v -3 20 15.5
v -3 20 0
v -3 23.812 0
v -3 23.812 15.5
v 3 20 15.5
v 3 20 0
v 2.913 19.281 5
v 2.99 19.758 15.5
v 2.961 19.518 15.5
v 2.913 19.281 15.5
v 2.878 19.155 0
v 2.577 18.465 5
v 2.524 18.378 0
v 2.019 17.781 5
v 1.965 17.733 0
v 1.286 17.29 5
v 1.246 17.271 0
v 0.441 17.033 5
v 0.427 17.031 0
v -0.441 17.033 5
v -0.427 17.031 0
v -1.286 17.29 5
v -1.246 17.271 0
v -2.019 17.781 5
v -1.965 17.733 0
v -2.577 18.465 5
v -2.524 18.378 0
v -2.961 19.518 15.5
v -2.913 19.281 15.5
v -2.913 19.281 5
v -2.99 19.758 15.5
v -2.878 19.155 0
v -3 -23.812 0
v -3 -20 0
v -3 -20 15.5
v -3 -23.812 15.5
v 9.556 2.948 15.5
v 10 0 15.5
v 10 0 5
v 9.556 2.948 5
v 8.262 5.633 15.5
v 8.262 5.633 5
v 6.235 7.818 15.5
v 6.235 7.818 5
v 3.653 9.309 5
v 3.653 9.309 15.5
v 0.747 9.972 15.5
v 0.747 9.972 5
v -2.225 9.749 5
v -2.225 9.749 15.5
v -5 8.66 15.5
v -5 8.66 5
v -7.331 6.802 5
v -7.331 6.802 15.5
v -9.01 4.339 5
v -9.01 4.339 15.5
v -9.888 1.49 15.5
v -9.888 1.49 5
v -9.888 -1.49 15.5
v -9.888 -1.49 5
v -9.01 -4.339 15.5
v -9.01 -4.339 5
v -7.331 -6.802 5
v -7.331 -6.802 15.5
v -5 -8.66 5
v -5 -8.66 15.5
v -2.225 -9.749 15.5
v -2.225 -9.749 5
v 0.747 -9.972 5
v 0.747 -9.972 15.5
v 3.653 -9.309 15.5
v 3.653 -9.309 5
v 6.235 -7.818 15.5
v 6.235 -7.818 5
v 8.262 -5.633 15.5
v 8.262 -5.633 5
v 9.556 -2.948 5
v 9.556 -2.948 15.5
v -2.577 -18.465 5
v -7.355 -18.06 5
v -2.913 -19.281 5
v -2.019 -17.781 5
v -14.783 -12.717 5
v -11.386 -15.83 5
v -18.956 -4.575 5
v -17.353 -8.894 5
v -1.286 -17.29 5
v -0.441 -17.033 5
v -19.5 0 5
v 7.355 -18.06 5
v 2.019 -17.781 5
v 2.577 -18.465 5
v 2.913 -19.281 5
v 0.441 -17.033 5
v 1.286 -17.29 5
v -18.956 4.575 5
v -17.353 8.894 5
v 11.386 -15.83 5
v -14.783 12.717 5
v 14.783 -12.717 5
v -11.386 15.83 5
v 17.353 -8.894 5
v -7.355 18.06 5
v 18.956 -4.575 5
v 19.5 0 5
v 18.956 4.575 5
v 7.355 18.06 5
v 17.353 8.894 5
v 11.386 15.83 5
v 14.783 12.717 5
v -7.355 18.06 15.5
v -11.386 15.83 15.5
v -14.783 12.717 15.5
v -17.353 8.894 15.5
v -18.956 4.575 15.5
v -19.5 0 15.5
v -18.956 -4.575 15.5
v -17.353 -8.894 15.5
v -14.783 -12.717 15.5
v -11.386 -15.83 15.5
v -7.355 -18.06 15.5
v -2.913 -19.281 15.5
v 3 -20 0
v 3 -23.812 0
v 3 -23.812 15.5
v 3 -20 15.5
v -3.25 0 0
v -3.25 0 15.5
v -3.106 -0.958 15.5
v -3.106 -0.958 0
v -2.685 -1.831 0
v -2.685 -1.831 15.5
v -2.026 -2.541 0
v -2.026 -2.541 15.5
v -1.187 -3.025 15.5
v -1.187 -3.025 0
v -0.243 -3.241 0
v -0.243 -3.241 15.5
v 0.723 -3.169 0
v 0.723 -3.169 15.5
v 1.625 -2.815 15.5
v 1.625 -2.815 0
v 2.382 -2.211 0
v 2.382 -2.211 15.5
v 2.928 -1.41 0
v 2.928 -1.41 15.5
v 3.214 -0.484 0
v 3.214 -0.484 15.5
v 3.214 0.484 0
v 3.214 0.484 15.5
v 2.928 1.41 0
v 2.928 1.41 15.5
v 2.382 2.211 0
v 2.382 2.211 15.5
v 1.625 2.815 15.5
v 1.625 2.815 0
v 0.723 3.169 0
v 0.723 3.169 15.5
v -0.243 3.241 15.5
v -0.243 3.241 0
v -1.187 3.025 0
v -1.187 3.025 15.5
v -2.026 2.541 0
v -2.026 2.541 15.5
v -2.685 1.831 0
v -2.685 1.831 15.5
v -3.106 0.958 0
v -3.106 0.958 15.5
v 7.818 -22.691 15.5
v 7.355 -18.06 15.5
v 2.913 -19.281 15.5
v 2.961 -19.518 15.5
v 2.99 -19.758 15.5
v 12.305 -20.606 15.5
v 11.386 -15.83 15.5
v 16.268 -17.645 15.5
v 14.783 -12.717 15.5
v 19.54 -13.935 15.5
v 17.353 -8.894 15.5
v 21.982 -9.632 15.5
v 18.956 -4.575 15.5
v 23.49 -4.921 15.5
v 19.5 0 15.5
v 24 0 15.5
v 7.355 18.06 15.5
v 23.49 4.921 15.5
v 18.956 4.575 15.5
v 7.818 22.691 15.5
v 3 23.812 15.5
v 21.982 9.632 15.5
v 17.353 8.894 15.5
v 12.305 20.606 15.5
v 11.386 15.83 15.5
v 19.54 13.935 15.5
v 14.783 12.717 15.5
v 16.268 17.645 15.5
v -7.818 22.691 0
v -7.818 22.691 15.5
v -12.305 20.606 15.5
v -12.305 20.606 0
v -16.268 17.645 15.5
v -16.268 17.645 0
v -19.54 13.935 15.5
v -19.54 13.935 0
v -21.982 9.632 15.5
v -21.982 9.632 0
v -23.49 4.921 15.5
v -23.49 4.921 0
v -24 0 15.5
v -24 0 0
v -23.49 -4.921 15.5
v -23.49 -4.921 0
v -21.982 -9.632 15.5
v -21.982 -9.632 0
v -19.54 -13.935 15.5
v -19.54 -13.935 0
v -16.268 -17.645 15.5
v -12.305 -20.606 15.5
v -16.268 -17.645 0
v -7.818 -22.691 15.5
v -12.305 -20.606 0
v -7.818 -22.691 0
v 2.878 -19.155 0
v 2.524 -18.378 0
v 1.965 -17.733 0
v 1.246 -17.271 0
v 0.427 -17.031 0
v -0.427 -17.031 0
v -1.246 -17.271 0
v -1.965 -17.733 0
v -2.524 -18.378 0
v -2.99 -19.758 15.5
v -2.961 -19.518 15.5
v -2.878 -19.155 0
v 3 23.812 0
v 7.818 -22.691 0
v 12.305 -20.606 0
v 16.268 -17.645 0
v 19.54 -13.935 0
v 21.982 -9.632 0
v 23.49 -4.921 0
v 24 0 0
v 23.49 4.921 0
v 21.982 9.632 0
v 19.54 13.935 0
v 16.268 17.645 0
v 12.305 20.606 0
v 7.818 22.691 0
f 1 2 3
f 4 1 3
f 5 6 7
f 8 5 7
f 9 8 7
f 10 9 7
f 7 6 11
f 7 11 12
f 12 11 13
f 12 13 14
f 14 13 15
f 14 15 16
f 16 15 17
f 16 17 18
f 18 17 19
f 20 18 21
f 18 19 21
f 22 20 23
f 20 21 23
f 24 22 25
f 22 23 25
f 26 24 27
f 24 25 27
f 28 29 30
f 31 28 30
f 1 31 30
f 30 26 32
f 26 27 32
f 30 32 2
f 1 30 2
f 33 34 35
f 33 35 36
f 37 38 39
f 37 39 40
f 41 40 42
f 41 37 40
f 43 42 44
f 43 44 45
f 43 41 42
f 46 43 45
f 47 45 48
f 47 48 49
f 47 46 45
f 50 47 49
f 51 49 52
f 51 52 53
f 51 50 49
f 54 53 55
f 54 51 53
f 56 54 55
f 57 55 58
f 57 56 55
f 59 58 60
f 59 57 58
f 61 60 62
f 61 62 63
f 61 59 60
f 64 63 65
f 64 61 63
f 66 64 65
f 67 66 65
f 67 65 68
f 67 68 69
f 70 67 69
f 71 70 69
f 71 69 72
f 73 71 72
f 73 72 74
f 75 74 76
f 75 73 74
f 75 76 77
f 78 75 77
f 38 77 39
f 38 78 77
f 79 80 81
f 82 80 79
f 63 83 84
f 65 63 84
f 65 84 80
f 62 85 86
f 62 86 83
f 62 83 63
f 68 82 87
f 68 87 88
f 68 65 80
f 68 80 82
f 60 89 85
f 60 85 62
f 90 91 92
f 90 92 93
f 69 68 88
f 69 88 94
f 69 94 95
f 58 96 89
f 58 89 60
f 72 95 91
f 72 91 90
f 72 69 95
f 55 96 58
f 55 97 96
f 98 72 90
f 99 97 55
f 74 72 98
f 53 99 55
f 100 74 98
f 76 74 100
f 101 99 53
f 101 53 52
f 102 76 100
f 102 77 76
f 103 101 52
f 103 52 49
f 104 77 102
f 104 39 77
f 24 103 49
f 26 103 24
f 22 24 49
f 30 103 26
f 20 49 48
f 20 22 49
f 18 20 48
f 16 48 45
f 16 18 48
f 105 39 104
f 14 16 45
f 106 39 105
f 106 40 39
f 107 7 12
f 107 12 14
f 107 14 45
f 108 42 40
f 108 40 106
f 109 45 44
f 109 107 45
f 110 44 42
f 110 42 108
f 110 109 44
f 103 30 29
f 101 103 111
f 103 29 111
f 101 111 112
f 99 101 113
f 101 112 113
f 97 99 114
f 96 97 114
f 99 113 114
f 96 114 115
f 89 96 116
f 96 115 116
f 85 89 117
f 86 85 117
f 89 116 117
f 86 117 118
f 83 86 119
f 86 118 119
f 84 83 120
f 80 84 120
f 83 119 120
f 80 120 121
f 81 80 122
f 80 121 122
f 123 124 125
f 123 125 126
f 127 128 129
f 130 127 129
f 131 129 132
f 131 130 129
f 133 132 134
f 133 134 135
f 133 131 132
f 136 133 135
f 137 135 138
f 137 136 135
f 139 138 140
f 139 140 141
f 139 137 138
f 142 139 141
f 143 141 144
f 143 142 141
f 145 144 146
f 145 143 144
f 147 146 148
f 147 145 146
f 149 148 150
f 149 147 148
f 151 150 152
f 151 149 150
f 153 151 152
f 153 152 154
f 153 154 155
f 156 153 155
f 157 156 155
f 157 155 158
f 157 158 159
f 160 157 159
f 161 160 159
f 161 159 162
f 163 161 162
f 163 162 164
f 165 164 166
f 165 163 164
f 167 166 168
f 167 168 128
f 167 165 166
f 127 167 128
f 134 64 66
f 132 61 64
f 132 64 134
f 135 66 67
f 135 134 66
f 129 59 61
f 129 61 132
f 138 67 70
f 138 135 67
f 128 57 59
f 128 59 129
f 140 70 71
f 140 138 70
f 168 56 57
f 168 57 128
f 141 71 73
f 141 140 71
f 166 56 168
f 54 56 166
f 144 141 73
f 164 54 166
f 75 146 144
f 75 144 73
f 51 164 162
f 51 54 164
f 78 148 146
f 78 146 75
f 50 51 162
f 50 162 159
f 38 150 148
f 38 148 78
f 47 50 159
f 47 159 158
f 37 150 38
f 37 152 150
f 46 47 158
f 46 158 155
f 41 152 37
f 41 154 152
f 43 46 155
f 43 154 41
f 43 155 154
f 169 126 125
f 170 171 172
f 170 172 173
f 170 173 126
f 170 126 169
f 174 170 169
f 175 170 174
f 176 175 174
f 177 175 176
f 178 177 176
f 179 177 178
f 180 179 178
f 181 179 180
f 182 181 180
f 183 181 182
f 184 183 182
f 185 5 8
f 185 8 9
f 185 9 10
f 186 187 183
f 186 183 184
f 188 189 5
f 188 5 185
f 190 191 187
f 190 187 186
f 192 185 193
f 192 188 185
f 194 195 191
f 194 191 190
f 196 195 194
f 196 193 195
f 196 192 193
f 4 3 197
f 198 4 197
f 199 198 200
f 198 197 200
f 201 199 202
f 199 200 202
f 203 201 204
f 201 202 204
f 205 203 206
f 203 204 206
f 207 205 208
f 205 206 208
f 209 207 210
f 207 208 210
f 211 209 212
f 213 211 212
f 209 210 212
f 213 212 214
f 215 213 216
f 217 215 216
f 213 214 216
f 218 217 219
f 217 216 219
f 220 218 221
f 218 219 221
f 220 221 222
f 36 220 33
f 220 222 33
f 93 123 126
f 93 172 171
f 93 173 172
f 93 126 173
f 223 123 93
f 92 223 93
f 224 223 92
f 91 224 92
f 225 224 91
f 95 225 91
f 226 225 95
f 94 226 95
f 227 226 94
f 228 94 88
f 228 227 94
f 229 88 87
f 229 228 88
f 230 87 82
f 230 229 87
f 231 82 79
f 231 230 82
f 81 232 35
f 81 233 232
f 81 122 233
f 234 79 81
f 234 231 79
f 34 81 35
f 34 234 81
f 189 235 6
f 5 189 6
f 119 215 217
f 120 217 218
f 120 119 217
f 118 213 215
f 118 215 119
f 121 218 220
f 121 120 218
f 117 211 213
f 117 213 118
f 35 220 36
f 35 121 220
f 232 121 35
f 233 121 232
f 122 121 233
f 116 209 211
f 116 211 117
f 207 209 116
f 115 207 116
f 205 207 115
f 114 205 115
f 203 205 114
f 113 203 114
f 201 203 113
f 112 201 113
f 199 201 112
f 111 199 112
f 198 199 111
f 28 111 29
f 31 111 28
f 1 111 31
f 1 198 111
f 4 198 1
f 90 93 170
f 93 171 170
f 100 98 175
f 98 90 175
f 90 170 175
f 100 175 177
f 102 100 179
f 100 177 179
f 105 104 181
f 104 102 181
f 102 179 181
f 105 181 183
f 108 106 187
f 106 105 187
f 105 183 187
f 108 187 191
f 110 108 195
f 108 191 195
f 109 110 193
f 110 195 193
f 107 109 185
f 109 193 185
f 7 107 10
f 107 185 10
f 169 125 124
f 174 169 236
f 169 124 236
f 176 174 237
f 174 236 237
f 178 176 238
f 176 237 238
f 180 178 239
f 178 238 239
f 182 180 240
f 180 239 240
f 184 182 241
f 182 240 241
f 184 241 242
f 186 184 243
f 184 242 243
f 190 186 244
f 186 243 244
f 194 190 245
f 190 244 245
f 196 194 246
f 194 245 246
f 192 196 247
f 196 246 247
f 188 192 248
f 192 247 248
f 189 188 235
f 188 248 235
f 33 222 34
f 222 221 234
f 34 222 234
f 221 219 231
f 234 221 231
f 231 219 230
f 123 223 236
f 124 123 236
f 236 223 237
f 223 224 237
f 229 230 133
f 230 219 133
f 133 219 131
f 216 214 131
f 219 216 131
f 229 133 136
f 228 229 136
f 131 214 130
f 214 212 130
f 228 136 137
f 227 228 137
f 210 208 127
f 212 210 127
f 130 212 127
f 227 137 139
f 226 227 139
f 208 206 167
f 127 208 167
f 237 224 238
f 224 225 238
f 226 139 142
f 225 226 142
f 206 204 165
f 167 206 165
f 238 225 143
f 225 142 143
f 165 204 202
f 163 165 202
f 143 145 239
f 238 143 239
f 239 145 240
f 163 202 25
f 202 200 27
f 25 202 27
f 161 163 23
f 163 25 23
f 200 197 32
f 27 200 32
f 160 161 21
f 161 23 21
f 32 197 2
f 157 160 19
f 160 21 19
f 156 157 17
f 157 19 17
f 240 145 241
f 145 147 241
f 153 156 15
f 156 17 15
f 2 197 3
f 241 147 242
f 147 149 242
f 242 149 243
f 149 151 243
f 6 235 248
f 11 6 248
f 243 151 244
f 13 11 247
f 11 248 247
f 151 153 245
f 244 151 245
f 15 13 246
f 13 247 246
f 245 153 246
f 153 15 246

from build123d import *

# Parameters (mm, degrees)
SKETCH_1_R          = 24
SKETCH_1_R_2        = 3.25
EXTRUDE_1_DEPTH     = 15.5
SKETCH_2_R          = 19.5
SKETCH_2_R_2        = 10
CUT_EXTRUDE_1_DEPTH = 10.5
CUT_EXTRUDE_2_DEPTH = 20


with BuildPart() as part:
    # Эскиз1 → Вытянуть1 (new body)
    with BuildSketch(Plane.XY):
        Circle(SKETCH_1_R)
        with Locations(Location((0, 0, 0), (0, 0, 180))):
            Circle(SKETCH_1_R_2, mode=Mode.SUBTRACT)
    extrude(amount=EXTRUDE_1_DEPTH)

    # Эскиз2 → Вырез-Вытянуть1 (cut)
    with BuildSketch(Plane.XY.offset(15.5)):
        Circle(SKETCH_2_R)
        Circle(SKETCH_2_R_2, mode=Mode.SUBTRACT)
    extrude(amount=-CUT_EXTRUDE_1_DEPTH, mode=Mode.SUBTRACT)

    # Эскиз3 → Вырез-Вытянуть2 (cut)
    with BuildSketch(Plane(origin=(0, 0, 0), x_dir=(-1, 0, 0), z_dir=(0, 0, -1))):
        with BuildLine():
            Line((3, 20), (3, 23.8117618))
            ThreePointArc((3, 23.8117618), (0, 24), (-3, 23.8117618))
            Line((-3, 23.8117618), (-3, 20))
            ThreePointArc((-3, 20), (0, 17), (3, 20))
        make_face()
        with BuildLine():
            Line((3, -20), (3, -23.8117618))
            ThreePointArc((3, -23.8117618), (0, -24), (-3, -23.8117618))
            Line((-3, -23.8117618), (-3, -20))
            ThreePointArc((-3, -20), (0, -17), (3, -20))
        make_face()
    extrude(amount=-CUT_EXTRUDE_2_DEPTH, mode=Mode.SUBTRACT)


solid = part.part
